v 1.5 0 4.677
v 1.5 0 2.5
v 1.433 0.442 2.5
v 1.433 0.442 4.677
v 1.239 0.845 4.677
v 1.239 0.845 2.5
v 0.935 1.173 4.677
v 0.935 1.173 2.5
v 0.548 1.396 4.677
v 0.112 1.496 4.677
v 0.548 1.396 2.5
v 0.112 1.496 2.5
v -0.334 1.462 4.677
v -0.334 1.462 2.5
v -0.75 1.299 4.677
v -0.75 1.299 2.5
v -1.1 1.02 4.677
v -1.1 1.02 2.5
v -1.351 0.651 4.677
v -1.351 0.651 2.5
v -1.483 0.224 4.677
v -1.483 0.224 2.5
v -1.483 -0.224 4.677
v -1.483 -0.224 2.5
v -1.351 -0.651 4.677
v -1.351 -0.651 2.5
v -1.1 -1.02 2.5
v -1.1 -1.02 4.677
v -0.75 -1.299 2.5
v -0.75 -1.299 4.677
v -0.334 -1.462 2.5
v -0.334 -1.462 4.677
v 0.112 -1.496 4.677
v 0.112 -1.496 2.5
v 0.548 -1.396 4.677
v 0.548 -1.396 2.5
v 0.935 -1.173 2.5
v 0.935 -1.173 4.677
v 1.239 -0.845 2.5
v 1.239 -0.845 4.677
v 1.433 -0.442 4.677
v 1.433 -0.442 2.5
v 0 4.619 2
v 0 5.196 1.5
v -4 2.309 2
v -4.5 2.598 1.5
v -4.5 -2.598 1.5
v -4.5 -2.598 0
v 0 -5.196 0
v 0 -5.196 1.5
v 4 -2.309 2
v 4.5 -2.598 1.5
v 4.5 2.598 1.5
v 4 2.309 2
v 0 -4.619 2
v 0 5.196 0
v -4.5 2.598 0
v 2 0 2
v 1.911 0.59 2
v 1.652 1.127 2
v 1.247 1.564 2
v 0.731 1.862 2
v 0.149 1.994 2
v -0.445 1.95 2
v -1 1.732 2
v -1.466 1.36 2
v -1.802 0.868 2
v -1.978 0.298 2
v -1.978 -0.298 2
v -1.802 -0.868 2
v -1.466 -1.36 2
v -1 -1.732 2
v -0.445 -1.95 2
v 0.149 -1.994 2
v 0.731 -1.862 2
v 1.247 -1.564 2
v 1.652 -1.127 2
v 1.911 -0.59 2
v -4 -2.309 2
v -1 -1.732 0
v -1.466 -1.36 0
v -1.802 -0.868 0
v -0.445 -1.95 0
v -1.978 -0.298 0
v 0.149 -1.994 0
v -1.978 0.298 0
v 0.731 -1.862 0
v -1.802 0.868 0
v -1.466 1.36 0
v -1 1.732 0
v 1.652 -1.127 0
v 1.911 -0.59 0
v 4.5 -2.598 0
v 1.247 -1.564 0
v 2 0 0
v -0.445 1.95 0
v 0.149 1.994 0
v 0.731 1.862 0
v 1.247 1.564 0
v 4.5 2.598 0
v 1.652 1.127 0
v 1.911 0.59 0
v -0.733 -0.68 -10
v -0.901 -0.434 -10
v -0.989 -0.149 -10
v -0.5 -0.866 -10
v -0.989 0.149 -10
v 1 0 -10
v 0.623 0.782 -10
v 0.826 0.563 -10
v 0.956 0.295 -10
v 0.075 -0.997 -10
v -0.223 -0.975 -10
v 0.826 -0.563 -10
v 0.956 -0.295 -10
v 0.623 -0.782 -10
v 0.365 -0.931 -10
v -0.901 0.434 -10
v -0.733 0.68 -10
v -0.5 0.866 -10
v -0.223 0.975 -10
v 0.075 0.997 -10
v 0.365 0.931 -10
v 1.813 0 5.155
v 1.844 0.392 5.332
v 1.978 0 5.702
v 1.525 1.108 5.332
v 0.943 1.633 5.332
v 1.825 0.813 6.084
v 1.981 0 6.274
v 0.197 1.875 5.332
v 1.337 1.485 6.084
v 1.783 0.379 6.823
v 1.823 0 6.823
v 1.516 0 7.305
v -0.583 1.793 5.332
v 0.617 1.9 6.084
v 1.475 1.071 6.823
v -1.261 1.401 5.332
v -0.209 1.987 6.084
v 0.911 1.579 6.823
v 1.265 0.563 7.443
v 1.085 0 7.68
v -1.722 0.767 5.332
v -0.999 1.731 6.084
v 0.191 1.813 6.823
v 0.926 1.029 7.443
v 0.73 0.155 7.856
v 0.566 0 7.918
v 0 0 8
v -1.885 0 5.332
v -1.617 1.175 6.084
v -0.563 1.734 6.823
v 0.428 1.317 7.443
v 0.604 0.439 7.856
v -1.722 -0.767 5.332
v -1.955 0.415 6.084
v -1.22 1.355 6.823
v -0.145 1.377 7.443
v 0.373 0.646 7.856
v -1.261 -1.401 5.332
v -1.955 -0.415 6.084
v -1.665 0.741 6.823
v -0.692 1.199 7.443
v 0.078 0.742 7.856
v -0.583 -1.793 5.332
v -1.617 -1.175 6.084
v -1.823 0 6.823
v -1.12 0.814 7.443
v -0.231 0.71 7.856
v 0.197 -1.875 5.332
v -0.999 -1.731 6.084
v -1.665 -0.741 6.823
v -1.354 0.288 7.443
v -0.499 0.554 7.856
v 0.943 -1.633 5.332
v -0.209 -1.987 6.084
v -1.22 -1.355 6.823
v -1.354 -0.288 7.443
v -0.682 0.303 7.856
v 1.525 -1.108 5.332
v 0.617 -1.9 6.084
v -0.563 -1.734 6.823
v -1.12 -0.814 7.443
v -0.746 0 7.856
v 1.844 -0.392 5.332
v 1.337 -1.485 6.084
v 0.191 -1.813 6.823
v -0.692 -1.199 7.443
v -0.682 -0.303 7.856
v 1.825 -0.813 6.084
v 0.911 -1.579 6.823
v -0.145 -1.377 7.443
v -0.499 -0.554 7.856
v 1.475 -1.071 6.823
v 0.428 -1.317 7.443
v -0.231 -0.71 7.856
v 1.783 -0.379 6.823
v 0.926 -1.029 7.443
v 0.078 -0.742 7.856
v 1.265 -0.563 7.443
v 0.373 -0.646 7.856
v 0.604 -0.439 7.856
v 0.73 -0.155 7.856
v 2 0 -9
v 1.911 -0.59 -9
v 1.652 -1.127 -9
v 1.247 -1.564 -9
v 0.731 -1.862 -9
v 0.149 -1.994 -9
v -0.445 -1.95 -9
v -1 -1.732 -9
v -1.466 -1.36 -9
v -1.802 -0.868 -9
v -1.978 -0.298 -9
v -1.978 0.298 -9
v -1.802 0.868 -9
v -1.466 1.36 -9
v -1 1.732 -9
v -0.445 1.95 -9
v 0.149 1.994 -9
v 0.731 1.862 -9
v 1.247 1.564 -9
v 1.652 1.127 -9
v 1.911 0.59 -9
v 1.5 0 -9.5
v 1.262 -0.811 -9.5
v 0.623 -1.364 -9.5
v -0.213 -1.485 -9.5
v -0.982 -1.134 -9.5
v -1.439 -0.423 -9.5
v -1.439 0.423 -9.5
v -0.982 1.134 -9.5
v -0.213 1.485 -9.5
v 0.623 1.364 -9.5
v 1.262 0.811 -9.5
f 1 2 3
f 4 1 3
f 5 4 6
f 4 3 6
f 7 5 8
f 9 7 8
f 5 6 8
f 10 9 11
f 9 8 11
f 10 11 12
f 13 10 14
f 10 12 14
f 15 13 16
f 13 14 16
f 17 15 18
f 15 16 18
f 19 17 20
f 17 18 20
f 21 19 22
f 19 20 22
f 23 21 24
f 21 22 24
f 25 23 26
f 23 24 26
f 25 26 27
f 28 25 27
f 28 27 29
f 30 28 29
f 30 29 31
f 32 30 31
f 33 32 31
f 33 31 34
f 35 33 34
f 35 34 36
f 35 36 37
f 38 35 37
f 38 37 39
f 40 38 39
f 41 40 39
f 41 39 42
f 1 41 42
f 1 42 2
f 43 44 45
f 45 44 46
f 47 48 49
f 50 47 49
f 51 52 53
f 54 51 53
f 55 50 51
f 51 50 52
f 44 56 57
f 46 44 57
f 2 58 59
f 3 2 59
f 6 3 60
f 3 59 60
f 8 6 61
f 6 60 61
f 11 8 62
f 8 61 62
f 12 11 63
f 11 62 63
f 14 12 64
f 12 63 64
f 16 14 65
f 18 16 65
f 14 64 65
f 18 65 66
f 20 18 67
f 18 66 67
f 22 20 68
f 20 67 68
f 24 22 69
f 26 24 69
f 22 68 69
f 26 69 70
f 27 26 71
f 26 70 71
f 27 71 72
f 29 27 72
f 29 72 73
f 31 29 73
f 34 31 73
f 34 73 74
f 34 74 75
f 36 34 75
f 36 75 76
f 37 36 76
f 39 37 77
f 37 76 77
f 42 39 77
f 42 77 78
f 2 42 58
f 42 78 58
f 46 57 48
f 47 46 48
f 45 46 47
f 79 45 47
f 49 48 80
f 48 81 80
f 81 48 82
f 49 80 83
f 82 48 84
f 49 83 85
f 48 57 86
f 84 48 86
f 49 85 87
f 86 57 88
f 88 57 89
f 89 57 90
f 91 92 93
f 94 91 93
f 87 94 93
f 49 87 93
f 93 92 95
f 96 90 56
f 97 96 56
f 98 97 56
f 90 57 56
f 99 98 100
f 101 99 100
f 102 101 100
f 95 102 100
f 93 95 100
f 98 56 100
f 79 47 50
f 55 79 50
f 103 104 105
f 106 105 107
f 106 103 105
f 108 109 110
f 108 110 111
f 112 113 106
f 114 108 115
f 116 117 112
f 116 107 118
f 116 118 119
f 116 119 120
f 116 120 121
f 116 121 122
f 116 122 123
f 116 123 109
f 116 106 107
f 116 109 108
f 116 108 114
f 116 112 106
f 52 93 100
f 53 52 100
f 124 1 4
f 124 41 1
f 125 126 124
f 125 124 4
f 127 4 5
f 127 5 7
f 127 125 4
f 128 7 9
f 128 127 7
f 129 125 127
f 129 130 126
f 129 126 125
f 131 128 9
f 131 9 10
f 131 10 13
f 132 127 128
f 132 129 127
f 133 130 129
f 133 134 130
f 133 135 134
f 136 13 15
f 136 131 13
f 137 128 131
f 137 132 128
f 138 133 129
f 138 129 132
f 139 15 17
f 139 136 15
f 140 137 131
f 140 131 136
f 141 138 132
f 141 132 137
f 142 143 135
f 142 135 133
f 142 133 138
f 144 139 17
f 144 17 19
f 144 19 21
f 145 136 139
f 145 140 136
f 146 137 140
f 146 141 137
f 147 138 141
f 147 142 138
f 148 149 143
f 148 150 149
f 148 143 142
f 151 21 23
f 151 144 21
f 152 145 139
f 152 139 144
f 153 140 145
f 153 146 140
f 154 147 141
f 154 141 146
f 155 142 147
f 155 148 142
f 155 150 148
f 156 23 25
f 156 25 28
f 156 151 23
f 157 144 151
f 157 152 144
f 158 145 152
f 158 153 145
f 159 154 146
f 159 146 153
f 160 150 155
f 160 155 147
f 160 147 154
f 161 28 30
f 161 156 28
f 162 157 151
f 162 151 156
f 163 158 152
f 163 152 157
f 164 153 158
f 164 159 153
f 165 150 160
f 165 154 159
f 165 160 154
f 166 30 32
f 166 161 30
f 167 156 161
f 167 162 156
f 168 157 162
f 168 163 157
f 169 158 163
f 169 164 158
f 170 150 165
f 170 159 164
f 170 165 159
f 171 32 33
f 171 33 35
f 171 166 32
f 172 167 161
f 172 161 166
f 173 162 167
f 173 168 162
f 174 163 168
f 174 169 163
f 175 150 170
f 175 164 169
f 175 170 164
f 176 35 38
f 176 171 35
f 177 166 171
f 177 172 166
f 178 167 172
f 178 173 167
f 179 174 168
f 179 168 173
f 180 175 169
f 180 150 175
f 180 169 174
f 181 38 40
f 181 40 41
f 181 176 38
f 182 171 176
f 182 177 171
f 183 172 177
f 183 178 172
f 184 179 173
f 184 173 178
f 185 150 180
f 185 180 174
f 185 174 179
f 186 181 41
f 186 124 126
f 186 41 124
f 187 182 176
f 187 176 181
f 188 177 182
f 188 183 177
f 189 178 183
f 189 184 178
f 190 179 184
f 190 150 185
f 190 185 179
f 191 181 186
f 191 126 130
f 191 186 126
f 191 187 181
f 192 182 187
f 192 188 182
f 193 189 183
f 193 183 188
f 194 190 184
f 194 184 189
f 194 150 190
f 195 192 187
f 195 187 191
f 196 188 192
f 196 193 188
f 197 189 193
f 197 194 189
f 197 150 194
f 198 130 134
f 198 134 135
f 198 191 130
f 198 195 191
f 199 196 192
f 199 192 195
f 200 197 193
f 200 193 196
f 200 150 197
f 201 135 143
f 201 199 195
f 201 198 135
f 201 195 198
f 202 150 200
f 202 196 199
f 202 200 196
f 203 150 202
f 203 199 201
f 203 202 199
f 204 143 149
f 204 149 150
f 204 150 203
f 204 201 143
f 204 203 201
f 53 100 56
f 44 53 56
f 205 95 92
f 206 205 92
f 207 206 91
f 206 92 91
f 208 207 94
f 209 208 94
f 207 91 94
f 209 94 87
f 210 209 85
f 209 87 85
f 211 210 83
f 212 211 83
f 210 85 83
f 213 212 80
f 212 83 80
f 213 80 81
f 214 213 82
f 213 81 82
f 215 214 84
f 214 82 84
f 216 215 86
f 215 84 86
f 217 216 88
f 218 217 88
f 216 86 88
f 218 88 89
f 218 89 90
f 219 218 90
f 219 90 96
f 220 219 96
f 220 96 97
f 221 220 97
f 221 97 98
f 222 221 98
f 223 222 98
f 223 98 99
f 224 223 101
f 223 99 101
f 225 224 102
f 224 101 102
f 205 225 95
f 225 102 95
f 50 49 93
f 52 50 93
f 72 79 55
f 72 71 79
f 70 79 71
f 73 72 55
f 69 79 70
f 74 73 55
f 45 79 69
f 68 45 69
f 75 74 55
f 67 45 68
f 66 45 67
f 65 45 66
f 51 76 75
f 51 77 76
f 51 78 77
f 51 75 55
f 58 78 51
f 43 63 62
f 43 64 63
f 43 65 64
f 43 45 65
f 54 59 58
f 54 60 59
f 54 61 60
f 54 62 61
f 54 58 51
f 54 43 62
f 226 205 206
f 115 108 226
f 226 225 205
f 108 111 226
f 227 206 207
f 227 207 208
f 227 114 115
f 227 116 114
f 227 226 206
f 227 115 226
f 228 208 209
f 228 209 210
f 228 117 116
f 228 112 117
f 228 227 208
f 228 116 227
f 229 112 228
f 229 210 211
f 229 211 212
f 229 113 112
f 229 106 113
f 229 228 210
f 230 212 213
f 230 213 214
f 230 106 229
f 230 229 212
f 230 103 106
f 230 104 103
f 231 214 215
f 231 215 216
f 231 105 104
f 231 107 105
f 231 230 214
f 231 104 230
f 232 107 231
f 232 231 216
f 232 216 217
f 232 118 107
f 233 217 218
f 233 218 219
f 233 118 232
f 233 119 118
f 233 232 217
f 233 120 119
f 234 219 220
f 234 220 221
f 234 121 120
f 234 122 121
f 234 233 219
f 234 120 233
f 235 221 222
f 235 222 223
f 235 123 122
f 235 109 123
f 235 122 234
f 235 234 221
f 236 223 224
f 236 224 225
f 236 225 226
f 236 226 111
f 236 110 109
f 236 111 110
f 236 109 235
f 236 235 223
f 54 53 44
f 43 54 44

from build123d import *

# Parameters (mm, degrees)
F1_DEPTH = 2
F2_R     = 2
F3_DEPTH = 10
F4_SIZE  = 1
F5_R     = 1.5
F6_DEPTH = 3
F9_SIZE  = 0.5


with BuildPart() as f1:
    # F0 (on Top) → F1 (new body)
    with BuildSketch(Plane.XY):
        Polygon((4.5, -2.5980762114), (4.5, 2.5980762114), (0, 5.1961524227), (-4.5, 2.5980762114), (-4.5, -2.5980762114), (0, -5.1961524227), align=None)
    extrude(amount=F1_DEPTH)

    # F2 (on face) → F3 (join)
    with BuildSketch(Plane(origin=(0, 0, 0), x_dir=(1, 0, 0), z_dir=(0, 0, -1))):
        Circle(F2_R)
    extrude(amount=F3_DEPTH)

    # F4
    f4_edges = [f1.edges().sort_by_distance(p)[0] for p in [
        (-2, 0, -10),
    ]]
    chamfer(f4_edges, length=F4_SIZE)

    # F5 (on face) → F6 (join)
    with BuildSketch(Plane.XY.offset(2)):
        Circle(F5_R)
    extrude(amount=F6_DEPTH)

    # F7 (on Front) → F8 (revolve)
    with BuildSketch(Plane.XZ):
        with BuildLine():
            Line((1.5, 5), (1.5, 4.6771243445))
            ThreePointArc((1.5, 4.6771243445), (1.8228756555, 6.8228756555), (0, 8))
            Line((0, 8), (0, 5))
            Line((0, 5), (1.5, 5))
        make_face()
    revolve(axis=Axis((0, 0, 2), (0, 0, 1)))

    # F9
    f9_edges = [f1.edges().sort_by_distance(p)[0] for p in [
        (2.25, -3.897114, 2),
        (4.5, 0, 2),
        (2.25, 3.897114, 2),
        (-2.25, 3.897114, 2),
        (-2.25, -3.897114, 2),
        (-4.5, 0, 2),
        (-1.5, 0, 2),
    ]]
    chamfer(f9_edges, length=F9_SIZE)


solid = f1.part
